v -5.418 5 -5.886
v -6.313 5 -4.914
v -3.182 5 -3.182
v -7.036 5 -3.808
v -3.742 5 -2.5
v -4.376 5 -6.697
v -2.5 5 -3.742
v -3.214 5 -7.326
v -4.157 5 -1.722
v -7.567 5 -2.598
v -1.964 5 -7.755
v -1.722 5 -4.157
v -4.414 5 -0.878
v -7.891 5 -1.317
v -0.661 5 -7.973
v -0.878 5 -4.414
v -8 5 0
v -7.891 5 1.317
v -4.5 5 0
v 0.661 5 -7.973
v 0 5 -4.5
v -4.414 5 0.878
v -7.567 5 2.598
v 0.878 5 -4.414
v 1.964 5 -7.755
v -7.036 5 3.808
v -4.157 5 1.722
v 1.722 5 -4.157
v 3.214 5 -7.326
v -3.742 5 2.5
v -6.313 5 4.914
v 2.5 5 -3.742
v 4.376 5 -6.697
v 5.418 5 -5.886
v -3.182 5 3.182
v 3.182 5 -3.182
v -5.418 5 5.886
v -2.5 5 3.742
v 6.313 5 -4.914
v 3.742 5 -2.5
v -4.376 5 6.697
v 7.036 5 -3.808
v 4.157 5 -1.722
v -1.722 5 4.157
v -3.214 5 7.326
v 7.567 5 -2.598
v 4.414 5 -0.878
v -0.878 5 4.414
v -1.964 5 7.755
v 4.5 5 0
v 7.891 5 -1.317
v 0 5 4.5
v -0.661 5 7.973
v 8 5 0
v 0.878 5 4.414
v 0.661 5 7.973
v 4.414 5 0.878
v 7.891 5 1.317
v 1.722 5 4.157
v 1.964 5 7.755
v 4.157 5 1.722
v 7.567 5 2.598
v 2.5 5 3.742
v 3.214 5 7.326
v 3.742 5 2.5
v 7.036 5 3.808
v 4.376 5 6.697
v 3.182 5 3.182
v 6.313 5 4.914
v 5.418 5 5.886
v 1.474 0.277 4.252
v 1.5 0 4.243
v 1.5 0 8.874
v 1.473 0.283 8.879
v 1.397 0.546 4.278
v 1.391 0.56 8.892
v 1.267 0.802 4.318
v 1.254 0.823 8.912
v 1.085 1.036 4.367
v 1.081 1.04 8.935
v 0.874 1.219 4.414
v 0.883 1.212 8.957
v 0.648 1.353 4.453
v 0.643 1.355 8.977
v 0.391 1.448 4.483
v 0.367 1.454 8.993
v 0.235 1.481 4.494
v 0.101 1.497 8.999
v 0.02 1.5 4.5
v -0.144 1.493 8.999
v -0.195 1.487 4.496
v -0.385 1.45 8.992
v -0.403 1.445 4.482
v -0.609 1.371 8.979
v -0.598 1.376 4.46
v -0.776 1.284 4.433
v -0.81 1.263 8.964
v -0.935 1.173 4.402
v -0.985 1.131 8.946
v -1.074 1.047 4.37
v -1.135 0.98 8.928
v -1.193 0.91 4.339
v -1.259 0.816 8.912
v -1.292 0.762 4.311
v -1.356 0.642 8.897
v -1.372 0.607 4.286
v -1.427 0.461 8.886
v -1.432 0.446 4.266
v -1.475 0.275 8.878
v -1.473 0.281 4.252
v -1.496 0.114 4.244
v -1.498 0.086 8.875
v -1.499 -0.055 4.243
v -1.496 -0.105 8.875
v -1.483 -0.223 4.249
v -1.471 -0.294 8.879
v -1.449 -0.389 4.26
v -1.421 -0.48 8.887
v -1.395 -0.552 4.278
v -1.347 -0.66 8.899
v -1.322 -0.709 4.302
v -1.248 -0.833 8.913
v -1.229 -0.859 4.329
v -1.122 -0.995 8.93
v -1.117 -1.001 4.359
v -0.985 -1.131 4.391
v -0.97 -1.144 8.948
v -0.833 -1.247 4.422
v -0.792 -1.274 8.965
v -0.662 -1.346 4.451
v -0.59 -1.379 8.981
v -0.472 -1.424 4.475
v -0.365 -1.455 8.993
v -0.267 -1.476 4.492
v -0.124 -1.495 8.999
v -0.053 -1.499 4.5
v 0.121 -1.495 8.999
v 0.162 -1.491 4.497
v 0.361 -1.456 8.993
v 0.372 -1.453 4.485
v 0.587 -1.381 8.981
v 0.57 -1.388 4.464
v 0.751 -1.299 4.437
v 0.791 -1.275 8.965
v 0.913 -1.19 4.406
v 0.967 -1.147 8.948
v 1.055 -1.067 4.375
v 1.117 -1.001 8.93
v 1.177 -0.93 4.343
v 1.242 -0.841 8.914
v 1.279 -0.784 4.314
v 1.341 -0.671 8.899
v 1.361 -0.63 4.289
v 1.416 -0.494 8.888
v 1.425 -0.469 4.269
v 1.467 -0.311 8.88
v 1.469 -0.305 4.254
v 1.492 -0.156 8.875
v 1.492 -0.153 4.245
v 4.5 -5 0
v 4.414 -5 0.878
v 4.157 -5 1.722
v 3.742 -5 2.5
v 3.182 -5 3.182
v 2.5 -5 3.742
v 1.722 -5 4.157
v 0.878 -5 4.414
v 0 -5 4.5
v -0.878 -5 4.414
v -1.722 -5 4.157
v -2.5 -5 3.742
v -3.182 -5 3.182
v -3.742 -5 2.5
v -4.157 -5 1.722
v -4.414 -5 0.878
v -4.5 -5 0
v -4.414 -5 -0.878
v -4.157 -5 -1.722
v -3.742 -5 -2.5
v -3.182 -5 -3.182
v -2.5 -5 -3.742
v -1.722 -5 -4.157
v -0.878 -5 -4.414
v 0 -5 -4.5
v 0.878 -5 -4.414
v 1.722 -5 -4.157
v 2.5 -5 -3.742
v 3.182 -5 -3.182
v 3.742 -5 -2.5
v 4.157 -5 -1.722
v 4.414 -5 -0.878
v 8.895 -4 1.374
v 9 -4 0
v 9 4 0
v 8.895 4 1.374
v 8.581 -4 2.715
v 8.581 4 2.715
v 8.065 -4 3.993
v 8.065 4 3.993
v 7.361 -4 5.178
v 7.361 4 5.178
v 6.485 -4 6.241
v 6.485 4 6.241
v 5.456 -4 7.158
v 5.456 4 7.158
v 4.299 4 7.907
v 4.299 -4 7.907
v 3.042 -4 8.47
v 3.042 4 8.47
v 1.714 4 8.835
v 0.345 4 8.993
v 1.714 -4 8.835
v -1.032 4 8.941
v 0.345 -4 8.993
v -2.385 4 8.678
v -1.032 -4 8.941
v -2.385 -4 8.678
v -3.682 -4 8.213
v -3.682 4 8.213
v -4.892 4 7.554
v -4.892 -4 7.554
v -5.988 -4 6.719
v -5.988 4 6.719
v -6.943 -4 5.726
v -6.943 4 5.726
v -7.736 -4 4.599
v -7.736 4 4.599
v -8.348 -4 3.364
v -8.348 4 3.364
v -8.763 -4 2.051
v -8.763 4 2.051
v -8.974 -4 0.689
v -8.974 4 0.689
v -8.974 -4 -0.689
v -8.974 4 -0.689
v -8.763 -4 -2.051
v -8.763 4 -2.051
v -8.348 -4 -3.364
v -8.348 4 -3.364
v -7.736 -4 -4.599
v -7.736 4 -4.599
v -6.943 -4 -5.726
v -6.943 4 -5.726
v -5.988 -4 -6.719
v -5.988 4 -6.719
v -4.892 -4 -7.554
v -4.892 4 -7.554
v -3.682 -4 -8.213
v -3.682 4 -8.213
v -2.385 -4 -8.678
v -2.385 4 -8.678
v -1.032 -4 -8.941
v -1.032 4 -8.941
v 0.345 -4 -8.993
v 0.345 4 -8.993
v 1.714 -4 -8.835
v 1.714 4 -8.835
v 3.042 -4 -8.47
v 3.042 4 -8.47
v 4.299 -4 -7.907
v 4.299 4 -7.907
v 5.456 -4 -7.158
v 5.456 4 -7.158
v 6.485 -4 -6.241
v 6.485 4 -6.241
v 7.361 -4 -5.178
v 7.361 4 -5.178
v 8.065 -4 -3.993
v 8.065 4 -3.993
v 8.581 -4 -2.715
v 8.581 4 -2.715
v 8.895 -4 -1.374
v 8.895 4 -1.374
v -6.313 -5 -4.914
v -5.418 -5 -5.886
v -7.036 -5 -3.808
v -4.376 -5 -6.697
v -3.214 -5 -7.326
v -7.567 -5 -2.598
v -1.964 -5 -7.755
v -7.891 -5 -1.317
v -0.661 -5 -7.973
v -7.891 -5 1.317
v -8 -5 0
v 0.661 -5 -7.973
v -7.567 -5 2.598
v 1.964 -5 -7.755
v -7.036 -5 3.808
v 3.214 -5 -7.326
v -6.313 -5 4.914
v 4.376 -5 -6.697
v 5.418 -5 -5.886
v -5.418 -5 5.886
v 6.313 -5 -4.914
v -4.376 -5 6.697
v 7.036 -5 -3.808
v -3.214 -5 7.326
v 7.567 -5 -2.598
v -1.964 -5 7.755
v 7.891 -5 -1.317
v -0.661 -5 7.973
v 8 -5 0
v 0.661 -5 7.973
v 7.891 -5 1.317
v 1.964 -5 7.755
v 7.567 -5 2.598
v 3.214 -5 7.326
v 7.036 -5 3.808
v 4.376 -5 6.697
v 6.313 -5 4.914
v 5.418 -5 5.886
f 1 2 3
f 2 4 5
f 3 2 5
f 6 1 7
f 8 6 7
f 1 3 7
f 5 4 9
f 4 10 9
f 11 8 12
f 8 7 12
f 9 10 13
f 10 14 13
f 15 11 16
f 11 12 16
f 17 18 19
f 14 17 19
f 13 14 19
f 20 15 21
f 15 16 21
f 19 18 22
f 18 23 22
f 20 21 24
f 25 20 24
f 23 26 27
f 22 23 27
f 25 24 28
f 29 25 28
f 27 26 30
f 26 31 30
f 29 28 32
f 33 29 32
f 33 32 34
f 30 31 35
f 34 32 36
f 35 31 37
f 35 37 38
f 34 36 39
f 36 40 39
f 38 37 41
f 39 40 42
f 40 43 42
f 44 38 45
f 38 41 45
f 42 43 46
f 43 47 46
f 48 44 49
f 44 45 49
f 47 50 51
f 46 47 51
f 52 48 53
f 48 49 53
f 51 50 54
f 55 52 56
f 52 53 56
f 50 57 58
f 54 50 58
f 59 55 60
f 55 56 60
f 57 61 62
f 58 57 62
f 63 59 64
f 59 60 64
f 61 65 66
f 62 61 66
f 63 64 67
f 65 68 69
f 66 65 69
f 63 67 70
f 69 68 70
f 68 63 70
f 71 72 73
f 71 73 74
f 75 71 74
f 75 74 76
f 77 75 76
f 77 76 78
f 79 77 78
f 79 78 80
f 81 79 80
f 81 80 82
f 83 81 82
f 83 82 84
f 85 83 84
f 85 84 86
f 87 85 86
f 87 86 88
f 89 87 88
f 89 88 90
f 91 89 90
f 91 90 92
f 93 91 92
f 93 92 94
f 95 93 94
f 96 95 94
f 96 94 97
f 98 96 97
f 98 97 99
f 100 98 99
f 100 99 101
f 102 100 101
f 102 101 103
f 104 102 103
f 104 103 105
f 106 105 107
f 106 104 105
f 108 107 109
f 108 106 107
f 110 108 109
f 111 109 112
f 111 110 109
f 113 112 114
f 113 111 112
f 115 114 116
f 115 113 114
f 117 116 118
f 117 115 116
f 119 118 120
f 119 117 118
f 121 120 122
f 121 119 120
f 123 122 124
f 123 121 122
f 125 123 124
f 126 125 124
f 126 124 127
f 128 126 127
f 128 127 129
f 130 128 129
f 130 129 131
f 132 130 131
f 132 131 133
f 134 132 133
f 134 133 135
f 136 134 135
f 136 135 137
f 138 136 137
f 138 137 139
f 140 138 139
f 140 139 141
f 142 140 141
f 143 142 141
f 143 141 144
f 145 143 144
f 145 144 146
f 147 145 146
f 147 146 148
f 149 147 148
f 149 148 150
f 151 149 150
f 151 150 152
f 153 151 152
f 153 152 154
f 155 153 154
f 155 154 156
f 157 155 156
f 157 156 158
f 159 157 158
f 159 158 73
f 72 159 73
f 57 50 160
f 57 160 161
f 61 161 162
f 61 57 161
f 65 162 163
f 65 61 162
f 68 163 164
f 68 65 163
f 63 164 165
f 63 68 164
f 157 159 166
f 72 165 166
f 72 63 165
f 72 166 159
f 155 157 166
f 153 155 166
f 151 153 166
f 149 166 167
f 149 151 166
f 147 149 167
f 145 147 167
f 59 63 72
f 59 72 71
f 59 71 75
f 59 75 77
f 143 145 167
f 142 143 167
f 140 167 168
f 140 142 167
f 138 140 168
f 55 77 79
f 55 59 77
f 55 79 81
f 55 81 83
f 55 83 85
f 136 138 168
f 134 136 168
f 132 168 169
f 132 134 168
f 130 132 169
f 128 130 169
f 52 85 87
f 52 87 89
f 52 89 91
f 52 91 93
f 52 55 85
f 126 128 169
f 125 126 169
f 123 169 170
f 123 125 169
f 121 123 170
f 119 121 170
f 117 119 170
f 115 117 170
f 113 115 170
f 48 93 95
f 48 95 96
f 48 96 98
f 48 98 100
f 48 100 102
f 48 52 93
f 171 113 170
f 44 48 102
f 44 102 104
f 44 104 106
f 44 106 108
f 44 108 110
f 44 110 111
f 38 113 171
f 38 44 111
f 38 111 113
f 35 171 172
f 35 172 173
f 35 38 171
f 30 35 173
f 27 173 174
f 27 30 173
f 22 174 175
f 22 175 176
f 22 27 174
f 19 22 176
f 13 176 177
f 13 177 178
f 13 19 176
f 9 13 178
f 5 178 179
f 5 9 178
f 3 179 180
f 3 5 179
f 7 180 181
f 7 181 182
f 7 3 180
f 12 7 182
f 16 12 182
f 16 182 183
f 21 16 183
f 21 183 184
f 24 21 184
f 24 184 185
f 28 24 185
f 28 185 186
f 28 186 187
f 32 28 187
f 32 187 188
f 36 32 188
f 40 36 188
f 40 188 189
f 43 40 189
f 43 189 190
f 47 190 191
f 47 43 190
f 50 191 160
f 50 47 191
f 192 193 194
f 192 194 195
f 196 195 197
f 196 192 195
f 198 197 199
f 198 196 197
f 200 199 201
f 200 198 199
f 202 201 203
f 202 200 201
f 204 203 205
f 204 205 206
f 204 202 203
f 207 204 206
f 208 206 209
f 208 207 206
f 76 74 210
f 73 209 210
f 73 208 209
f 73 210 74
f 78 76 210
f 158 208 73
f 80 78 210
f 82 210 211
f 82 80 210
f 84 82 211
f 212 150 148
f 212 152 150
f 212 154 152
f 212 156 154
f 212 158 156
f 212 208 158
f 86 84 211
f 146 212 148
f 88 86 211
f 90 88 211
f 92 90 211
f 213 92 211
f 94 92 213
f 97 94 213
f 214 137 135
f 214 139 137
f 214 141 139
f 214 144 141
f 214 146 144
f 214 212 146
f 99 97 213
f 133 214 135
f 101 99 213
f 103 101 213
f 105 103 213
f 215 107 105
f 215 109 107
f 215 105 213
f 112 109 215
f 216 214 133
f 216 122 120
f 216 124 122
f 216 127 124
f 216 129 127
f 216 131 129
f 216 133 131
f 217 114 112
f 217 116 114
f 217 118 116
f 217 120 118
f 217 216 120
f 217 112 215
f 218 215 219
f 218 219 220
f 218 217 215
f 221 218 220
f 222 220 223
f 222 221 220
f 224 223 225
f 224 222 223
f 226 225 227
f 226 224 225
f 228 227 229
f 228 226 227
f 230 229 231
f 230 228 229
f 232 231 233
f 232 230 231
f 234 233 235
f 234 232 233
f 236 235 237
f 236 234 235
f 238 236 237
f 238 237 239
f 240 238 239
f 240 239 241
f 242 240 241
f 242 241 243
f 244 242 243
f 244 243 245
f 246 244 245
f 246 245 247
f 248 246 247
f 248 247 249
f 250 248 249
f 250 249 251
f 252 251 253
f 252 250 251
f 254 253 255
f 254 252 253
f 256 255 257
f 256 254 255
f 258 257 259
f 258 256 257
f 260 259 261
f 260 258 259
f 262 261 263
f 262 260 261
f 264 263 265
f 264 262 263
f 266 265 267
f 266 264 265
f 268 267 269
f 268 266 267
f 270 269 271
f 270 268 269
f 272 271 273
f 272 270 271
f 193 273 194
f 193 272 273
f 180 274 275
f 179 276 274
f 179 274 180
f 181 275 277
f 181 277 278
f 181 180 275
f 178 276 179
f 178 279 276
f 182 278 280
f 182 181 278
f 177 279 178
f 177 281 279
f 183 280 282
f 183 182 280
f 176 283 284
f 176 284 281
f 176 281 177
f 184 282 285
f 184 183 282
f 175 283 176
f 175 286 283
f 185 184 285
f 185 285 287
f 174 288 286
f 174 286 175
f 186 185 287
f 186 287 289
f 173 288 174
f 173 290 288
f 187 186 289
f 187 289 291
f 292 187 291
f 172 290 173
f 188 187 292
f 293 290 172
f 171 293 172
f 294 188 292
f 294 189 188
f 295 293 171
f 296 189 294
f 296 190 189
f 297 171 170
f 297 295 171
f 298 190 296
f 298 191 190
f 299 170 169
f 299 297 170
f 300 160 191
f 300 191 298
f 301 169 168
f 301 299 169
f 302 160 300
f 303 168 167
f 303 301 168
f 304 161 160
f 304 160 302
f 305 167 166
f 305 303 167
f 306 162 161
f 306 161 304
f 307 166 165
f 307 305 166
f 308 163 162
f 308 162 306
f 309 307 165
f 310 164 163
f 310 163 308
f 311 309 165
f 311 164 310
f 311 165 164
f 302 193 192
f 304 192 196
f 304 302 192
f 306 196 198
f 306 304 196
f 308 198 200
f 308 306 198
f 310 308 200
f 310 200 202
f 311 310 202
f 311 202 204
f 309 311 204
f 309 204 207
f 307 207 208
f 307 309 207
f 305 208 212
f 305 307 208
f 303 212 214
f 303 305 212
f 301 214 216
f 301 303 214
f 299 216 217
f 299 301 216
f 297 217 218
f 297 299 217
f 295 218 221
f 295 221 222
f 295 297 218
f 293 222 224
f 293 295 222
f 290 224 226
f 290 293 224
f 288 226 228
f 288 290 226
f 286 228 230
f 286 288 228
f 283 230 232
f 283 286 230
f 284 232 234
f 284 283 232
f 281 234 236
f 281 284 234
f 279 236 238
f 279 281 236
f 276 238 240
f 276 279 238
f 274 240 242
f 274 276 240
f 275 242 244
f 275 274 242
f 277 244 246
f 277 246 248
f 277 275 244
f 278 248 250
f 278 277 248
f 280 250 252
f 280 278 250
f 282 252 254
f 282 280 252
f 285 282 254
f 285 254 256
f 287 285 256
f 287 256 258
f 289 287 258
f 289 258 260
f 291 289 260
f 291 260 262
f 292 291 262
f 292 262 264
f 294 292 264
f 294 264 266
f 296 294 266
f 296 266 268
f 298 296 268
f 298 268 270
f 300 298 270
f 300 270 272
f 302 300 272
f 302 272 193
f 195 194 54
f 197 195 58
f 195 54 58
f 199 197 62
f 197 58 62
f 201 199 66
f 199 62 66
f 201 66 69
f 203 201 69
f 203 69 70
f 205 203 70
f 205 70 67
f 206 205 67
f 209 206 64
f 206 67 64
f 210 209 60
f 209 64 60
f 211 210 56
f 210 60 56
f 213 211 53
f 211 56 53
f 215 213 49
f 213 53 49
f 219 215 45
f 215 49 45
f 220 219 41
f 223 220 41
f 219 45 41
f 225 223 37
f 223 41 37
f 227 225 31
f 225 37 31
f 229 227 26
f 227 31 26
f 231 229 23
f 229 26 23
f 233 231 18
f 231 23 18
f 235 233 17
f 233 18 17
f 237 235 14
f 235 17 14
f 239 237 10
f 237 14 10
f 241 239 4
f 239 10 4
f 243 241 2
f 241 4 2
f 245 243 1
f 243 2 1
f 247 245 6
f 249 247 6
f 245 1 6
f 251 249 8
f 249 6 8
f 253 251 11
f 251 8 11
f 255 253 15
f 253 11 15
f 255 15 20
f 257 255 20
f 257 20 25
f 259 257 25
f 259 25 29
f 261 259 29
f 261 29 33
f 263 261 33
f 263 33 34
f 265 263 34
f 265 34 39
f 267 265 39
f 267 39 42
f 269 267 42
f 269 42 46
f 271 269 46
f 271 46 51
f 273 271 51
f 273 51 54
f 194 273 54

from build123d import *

# Parameters (mm, degrees)
F0_R     = 9
F0_R_2   = 4.5
F1_DEPTH = 5
F2_R     = 1.5
F3_DEPTH = 9.001
F4_SIZE  = 1


with BuildPart() as f1:
    # F0 (on Front) → F1 (new body, symmetric)
    with BuildSketch(Plane.XZ):
        Circle(F0_R)
        Circle(F0_R_2, mode=Mode.SUBTRACT)
    extrude(amount=F1_DEPTH, both=True)

    # F2 (on Top) → F3 (cut, through all)
    with BuildSketch(Plane.XY):
        Circle(F2_R)
    extrude(amount=F3_DEPTH, mode=Mode.SUBTRACT)

    # F4
    f4_edges = [f1.edges().sort_by_distance(p)[0] for p in [
        (-9, -5, 0),
        (-9, 5, 0),
    ]]
    chamfer(f4_edges, length=F4_SIZE)


solid = f1.part
